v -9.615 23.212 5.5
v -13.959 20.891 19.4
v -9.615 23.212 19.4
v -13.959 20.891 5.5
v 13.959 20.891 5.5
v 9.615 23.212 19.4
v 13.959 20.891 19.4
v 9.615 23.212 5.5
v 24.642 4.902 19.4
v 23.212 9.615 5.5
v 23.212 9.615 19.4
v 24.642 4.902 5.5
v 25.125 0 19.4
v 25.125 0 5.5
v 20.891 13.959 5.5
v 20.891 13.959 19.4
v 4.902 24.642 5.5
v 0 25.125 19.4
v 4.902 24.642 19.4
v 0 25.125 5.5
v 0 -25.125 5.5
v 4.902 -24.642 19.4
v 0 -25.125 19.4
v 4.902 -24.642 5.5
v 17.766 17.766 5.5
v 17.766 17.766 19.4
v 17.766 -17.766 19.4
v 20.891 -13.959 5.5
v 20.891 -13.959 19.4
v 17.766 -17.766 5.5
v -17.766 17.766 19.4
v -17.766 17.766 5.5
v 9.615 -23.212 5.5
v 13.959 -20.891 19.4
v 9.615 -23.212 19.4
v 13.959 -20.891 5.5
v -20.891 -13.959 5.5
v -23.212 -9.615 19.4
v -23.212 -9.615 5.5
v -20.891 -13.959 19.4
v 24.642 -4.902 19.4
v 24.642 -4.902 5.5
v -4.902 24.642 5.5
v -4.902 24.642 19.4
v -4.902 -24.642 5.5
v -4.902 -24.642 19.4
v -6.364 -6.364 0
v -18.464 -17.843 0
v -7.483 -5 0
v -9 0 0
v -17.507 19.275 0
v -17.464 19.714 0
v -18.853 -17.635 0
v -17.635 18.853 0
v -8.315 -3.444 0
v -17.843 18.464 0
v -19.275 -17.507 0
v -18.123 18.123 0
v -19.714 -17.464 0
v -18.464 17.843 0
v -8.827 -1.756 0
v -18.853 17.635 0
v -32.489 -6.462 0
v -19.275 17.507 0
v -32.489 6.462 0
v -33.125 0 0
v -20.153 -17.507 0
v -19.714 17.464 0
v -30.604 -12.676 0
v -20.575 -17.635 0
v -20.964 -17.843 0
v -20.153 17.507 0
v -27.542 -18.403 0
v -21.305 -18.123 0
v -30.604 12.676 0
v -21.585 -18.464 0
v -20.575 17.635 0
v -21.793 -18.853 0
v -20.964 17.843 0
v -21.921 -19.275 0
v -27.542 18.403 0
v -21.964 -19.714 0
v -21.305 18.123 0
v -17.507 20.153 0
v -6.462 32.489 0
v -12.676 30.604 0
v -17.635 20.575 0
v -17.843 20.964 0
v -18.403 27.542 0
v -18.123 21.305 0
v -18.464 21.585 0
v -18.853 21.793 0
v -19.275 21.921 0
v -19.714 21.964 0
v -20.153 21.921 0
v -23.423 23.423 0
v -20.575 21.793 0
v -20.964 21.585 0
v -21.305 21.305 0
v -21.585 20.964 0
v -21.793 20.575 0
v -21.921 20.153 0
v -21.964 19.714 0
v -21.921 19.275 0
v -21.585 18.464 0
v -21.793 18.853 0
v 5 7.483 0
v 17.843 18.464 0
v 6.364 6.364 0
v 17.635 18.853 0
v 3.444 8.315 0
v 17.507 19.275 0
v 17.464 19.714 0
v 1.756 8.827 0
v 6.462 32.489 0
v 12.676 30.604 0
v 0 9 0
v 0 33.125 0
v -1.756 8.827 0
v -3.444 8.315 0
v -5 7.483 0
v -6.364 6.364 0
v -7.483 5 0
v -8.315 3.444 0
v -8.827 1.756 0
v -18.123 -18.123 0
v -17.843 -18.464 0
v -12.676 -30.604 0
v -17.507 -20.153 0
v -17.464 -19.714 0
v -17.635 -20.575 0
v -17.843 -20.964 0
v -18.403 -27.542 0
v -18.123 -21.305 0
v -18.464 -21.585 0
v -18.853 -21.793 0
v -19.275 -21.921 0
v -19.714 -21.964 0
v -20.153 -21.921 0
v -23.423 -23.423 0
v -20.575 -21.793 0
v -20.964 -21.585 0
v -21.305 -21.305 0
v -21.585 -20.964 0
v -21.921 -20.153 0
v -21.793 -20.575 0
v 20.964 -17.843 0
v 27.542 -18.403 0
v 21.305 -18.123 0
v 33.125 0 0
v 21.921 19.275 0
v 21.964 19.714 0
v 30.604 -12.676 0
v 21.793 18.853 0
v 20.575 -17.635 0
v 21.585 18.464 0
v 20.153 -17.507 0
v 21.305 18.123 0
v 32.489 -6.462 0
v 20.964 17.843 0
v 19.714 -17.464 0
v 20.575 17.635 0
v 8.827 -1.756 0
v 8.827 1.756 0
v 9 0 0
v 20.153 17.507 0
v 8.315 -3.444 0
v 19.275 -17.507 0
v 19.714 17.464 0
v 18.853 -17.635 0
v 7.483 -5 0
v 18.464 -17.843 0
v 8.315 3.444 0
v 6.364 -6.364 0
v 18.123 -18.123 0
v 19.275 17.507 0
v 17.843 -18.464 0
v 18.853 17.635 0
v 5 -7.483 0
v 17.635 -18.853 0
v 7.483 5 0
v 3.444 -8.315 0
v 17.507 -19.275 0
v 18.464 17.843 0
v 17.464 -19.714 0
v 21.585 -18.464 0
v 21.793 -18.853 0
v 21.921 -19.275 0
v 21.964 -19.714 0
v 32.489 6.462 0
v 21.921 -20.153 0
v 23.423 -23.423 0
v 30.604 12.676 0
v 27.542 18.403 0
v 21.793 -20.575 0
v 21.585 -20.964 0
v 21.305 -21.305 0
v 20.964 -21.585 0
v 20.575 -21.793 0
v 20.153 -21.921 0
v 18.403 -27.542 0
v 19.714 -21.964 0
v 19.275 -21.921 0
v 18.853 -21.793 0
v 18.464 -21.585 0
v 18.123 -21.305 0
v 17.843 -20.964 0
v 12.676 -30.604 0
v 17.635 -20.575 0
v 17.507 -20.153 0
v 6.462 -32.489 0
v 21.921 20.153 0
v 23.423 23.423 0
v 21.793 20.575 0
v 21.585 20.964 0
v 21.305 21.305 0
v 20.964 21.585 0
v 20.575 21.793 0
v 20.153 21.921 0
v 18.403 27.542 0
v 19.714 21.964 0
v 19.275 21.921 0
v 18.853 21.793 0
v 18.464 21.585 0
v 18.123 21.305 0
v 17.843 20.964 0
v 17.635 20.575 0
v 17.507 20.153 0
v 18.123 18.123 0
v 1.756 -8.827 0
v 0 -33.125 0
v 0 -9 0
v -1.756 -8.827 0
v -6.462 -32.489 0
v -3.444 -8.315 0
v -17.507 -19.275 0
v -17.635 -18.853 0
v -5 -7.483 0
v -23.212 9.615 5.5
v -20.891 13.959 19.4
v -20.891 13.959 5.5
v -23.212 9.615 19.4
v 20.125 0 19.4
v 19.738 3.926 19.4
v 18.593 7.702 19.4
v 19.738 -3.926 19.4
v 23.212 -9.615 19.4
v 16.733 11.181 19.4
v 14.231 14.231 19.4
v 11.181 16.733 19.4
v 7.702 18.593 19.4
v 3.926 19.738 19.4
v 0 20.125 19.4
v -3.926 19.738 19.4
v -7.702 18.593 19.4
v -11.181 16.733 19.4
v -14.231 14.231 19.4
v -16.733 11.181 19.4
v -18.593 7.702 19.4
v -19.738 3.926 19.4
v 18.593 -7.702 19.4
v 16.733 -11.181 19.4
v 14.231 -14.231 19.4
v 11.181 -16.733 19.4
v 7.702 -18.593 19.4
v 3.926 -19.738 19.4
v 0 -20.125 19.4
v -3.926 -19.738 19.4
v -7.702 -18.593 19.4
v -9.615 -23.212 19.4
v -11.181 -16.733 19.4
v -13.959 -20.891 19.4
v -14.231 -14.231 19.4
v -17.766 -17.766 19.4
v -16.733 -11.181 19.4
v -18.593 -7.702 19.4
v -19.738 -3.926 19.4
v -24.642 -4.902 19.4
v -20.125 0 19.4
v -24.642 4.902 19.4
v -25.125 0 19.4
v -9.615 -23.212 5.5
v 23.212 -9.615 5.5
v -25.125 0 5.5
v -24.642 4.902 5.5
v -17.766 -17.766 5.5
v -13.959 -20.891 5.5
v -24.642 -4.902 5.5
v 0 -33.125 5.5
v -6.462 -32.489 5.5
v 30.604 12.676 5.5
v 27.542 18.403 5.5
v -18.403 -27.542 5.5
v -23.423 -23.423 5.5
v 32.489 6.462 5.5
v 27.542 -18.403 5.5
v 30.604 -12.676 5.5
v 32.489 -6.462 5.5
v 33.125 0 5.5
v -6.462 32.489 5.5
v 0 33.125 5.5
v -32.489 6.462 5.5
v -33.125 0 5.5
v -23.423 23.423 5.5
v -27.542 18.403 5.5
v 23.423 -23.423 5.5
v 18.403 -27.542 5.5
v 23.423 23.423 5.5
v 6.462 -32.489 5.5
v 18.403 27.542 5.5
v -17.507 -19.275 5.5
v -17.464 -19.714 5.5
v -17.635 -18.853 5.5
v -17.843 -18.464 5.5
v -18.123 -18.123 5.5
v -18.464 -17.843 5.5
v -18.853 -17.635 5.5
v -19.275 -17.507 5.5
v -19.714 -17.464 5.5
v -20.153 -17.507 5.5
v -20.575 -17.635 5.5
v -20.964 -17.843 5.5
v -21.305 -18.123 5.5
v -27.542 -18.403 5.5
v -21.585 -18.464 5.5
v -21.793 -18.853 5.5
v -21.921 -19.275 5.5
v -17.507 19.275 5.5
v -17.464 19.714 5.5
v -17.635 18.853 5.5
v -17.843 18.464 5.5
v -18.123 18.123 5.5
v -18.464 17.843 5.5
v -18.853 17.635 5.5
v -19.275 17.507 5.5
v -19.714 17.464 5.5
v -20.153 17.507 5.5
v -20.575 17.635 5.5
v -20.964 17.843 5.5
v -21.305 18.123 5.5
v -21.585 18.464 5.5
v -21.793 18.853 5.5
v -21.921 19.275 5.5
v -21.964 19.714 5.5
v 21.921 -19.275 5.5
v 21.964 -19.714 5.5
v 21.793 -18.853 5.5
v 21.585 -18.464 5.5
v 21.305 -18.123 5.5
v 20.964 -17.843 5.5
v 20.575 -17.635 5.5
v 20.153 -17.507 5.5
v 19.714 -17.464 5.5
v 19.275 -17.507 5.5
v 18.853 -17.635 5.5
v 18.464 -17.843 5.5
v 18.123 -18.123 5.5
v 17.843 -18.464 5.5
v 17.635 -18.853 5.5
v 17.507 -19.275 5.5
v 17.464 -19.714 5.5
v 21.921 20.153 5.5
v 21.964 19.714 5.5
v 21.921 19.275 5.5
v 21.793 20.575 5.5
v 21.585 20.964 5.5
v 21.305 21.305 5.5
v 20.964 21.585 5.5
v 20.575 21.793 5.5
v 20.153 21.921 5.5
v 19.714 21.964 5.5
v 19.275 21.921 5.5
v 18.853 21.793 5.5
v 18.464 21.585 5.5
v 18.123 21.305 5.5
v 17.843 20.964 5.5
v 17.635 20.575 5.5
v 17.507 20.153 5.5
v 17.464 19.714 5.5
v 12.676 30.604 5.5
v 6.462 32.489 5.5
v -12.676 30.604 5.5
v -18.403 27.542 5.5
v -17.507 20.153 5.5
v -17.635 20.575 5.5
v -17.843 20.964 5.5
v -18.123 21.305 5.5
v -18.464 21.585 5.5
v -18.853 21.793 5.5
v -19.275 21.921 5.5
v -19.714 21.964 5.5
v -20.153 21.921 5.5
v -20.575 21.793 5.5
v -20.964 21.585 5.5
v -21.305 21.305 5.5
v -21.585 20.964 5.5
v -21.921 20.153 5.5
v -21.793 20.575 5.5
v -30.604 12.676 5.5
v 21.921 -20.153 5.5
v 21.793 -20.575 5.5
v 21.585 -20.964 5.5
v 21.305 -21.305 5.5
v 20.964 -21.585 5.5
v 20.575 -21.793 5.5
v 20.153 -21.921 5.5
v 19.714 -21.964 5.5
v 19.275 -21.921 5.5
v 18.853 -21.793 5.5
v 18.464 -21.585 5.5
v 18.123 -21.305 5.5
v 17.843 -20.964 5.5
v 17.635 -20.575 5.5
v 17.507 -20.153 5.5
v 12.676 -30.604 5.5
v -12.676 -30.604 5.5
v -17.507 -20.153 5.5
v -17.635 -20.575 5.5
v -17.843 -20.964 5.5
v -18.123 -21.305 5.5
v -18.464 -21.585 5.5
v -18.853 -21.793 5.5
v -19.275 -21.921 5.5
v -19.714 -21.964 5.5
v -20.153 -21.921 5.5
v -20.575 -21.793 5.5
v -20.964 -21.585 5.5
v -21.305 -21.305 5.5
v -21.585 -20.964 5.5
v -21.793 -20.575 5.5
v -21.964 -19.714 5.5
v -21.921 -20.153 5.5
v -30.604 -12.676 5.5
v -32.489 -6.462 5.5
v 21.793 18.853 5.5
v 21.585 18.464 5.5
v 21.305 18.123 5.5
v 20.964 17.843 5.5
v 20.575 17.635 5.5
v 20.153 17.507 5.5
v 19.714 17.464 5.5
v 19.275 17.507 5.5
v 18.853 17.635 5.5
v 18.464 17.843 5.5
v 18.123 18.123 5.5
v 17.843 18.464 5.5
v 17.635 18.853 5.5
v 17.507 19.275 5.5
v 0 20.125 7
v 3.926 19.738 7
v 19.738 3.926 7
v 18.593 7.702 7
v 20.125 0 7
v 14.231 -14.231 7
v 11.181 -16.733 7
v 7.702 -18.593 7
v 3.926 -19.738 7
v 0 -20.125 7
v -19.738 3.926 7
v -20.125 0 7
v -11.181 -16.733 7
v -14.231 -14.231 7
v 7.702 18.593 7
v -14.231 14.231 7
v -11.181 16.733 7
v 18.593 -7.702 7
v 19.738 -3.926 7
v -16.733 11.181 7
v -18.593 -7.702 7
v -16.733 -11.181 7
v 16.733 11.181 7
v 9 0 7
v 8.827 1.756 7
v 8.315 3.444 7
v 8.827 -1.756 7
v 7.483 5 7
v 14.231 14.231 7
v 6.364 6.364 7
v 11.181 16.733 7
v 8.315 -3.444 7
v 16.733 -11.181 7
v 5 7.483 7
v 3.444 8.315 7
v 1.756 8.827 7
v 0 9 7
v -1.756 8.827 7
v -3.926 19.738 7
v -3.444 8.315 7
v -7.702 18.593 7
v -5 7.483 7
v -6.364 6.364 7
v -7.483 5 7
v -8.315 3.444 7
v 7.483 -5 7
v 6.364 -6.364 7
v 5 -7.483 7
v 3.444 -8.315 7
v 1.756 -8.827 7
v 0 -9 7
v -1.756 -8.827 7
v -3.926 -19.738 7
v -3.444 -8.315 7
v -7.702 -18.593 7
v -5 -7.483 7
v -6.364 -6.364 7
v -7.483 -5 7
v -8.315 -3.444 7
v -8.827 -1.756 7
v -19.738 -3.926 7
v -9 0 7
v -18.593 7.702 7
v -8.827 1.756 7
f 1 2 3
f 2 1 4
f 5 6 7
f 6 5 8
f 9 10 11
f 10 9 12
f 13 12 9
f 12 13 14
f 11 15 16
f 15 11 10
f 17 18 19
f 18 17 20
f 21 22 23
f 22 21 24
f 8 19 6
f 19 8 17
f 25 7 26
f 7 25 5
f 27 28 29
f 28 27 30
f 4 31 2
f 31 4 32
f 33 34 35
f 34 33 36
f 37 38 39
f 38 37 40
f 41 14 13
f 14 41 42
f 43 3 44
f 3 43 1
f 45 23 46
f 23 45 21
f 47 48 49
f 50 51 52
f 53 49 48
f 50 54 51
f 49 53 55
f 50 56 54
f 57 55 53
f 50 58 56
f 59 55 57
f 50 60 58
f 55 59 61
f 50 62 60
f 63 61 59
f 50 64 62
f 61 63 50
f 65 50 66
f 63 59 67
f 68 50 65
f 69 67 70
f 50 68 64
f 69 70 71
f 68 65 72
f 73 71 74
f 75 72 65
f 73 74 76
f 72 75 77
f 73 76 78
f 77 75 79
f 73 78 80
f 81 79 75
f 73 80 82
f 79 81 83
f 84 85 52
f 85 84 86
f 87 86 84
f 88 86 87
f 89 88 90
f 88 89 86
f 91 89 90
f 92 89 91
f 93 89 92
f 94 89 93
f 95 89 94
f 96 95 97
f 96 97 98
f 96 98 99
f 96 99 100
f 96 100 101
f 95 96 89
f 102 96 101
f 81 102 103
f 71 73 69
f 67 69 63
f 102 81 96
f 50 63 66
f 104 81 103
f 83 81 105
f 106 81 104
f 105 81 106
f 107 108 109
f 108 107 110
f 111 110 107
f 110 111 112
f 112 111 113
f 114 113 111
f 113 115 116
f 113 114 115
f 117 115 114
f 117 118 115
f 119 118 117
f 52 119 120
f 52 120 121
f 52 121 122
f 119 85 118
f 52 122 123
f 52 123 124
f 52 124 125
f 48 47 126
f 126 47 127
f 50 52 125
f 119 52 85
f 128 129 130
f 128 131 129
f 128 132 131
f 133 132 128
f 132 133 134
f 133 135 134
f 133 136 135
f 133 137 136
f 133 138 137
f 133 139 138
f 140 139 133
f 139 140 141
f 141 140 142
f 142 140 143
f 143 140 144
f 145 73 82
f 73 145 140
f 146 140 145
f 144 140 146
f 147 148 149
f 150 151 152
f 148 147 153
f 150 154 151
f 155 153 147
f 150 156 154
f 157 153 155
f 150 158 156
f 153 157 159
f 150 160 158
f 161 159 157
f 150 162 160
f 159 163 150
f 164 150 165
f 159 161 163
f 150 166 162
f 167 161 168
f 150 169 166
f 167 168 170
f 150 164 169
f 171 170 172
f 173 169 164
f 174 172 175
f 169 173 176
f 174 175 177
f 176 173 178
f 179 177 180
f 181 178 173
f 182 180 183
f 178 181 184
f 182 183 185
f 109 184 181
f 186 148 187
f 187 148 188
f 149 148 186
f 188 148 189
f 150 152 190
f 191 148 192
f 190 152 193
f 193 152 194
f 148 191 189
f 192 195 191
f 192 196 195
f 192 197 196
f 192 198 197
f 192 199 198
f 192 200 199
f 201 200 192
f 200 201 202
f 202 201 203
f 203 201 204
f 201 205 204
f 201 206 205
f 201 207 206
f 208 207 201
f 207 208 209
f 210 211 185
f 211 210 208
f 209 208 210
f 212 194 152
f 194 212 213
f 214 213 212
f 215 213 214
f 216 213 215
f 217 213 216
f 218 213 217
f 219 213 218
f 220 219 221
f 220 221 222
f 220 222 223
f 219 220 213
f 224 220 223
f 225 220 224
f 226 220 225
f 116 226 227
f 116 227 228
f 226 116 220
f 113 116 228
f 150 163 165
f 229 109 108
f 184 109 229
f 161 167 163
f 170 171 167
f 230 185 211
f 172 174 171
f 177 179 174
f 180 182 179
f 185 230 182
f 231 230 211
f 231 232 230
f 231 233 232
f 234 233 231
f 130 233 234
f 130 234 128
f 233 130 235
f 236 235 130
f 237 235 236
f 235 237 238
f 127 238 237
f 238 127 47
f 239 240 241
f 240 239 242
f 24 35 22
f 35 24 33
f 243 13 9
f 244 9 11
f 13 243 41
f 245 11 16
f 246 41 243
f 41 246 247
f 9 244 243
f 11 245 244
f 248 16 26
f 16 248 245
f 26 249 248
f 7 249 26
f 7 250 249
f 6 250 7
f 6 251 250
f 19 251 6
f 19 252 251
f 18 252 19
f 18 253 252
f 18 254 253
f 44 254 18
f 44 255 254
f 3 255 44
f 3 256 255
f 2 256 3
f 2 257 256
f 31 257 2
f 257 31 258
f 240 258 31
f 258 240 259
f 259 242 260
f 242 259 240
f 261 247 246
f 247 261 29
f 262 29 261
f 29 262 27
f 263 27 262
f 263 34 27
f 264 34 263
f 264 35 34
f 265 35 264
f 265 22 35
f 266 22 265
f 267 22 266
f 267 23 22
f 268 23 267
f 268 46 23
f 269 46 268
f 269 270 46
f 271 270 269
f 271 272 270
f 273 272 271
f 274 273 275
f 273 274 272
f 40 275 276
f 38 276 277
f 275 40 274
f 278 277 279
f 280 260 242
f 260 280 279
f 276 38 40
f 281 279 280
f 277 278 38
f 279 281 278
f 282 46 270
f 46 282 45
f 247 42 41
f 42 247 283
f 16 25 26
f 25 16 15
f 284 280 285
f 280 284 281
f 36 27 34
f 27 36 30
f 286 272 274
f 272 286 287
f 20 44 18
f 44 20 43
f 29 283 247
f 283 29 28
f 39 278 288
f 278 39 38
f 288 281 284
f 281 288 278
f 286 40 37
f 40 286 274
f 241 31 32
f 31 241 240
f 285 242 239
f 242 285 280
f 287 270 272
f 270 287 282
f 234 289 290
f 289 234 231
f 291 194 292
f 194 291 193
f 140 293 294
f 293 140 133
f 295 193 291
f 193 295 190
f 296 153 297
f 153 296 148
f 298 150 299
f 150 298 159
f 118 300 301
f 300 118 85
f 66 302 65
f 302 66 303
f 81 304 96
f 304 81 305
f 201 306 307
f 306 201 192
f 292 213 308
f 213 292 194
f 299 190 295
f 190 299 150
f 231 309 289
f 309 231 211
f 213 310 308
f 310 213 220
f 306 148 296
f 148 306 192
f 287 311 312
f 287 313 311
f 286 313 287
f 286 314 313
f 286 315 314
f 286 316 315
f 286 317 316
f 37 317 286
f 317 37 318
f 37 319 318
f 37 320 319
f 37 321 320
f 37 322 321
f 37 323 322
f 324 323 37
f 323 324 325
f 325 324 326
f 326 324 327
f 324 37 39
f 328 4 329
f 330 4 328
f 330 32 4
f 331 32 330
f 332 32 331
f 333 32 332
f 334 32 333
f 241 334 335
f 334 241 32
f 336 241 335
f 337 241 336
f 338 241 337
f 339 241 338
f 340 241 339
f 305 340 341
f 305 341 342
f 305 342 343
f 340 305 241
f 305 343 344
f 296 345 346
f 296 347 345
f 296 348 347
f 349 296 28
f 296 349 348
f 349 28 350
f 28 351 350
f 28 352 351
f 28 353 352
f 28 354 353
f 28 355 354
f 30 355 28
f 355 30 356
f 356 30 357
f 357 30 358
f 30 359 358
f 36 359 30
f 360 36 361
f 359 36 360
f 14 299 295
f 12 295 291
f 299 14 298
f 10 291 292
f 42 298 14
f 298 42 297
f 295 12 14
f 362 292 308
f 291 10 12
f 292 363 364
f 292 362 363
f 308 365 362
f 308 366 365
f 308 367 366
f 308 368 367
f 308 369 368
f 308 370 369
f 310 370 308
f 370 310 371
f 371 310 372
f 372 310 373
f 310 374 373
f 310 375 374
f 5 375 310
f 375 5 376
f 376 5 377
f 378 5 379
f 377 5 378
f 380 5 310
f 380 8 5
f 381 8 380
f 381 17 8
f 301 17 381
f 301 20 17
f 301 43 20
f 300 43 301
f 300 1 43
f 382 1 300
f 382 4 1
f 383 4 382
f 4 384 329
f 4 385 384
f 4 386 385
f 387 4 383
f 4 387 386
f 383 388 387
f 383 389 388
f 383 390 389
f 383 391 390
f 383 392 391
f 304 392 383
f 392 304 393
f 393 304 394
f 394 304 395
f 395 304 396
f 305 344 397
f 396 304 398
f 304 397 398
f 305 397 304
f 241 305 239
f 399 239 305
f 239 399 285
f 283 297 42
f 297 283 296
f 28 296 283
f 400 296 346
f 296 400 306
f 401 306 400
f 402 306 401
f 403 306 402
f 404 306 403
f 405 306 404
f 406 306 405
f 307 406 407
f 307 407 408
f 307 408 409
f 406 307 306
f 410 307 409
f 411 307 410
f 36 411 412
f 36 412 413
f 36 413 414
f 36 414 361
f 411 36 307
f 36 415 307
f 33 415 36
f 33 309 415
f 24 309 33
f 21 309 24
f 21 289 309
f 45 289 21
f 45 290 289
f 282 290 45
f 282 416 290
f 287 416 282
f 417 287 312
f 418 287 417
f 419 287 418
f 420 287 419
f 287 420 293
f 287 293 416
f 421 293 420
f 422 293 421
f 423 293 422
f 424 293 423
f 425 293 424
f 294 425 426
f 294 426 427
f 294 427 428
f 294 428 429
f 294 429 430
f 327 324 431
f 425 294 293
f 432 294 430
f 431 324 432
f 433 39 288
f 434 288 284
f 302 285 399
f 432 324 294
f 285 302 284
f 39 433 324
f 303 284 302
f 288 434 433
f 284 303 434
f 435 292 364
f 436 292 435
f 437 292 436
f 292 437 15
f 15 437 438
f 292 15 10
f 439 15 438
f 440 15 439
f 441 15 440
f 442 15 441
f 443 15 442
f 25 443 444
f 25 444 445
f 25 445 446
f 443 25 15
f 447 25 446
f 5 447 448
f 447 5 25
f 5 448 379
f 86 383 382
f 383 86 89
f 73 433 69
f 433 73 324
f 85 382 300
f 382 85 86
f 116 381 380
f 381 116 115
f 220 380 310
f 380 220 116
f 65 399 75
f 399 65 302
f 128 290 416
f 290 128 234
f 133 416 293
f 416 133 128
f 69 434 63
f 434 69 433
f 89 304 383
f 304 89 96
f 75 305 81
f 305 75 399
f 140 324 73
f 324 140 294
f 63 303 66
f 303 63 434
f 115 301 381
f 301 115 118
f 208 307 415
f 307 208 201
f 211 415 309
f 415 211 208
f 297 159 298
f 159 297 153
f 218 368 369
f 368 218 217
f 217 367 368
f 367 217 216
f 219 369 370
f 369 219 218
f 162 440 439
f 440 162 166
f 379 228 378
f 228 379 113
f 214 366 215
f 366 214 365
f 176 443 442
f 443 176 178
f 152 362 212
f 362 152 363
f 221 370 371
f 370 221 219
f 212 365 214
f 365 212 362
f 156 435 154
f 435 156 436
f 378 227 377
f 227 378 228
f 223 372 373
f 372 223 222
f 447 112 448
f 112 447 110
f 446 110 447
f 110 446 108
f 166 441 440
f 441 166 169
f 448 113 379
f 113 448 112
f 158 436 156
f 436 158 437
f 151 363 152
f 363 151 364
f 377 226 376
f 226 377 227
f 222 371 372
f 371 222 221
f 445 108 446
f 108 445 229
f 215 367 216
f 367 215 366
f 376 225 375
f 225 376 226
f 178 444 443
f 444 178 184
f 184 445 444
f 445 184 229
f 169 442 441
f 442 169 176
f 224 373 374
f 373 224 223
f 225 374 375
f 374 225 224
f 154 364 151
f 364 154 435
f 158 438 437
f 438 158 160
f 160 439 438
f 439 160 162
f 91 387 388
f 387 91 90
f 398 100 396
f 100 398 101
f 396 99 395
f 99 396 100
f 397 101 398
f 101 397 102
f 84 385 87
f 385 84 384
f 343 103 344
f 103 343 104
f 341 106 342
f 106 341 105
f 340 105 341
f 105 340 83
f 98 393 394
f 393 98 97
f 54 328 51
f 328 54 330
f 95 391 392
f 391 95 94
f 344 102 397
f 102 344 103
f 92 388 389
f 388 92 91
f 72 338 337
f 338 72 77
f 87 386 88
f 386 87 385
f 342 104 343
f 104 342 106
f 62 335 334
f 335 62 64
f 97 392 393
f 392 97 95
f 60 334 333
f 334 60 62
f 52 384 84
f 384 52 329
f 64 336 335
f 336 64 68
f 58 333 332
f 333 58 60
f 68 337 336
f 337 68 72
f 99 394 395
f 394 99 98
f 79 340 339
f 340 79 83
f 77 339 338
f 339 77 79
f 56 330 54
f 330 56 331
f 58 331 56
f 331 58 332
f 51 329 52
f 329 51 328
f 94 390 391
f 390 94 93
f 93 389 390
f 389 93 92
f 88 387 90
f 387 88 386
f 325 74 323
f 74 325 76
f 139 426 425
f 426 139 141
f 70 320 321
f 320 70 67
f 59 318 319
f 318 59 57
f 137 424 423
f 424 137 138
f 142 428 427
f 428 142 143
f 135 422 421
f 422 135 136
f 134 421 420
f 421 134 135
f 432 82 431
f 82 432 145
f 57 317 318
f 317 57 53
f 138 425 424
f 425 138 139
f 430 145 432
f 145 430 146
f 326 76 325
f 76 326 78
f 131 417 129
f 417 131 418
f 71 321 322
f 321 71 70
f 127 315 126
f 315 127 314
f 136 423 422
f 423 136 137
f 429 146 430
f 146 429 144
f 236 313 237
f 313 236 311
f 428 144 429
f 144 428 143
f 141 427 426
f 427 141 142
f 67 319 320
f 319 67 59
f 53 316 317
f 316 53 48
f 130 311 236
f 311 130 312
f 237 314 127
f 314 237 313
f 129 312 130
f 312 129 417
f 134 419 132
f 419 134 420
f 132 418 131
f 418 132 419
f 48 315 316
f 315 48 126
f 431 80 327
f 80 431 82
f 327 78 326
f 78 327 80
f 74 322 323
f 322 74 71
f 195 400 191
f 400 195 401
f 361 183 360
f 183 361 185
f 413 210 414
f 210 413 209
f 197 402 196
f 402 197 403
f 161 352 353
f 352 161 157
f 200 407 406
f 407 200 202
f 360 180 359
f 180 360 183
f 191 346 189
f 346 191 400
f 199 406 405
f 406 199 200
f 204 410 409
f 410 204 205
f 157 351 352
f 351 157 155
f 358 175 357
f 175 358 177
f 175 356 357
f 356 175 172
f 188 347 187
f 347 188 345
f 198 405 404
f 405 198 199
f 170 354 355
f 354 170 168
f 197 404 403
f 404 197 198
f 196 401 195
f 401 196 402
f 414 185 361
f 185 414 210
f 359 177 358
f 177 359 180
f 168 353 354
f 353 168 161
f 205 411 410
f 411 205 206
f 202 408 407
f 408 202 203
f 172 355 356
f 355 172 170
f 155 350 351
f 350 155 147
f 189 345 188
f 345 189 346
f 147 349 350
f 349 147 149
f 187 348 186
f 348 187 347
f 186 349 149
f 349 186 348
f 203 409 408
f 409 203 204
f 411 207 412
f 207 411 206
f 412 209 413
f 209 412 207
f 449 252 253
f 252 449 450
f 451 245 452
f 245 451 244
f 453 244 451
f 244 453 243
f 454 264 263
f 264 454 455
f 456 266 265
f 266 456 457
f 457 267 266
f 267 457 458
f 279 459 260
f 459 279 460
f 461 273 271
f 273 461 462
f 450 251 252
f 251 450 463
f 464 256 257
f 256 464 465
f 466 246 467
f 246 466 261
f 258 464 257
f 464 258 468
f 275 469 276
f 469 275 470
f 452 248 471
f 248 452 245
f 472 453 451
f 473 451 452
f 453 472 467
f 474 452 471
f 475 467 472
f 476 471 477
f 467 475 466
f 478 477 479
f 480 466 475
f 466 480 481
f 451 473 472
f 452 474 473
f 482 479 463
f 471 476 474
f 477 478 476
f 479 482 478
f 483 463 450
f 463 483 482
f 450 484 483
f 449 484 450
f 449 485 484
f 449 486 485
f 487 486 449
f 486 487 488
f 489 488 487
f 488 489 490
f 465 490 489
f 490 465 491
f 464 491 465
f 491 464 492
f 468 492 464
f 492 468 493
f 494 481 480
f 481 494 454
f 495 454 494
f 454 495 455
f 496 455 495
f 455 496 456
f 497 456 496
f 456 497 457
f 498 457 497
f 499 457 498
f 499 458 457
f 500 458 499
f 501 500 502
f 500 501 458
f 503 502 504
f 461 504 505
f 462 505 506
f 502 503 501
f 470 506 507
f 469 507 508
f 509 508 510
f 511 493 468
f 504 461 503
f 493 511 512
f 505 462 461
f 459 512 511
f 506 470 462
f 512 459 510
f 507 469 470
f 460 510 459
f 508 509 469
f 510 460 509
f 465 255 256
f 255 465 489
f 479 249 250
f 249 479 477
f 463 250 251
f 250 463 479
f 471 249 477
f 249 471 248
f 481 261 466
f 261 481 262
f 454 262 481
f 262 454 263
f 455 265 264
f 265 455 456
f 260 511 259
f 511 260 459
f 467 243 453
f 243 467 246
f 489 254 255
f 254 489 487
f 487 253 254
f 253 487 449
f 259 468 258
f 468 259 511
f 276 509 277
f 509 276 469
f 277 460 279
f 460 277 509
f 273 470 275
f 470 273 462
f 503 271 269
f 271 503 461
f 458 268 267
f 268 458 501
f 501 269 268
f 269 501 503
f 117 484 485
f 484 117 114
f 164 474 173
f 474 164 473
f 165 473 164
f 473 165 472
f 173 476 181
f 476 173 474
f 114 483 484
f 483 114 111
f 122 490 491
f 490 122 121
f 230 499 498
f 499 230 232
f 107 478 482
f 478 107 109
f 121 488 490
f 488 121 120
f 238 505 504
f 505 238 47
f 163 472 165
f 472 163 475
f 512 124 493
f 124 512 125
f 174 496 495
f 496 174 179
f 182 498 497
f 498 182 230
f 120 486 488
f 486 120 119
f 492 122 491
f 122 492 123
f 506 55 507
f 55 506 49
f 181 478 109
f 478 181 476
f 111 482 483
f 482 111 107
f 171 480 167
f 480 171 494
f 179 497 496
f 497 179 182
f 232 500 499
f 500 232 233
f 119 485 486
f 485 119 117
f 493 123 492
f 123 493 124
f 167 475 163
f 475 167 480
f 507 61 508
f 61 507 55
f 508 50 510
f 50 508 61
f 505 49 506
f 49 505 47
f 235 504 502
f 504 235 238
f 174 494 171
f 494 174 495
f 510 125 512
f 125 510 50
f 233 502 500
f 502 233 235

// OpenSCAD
$fn = 32;

// ----------------------------------------------------------------------
// Bearing housing: seat for 6203 (40 x 12 mm), 50.25 mm body
// ----------------------------------------------------------------------

// --- parameters (mm) ---
body_od = 50.25;          // housing outside diameter
body_h = 19.4;            // overall housing height
wall = 5;                 // wall thickness
pocket_d = 40.25;         // 6203 seat, 0.25 mm clearance
seat_h = 12.4;            // pocket depth
shoulder = 3;             // shoulder under the bearing
pass_d = 18;              // shaft passage
flange_dia = 66.25;       // mounting flange diameter
flange_t = 4;             // flange thickness
bolt_d = 4.5;             // flange bolt clearance
bolt_r = 27.88;           // flange bolt circle radius

module body() {
  cylinder(h = body_h, d = body_od);
}

module flange() {
  /* flange sunk 1.5 mm into the body */
  cylinder(h = flange_t + 1.5, d = flange_dia);
}

difference() {
  union() {
    body();
    flange();
  }
  translate([0, 0, body_h - seat_h]) cylinder(h = seat_h + 1, d = pocket_d);
  translate([0, 0, -1]) cylinder(h = body_h - seat_h + 1, d = pass_d);
  for (i = [0 : 3]) rotate([0, 0, 45 + i * 90]) translate([bolt_r, 0, -1])
    cylinder(h = flange_t + 3, d = bolt_d);
}
